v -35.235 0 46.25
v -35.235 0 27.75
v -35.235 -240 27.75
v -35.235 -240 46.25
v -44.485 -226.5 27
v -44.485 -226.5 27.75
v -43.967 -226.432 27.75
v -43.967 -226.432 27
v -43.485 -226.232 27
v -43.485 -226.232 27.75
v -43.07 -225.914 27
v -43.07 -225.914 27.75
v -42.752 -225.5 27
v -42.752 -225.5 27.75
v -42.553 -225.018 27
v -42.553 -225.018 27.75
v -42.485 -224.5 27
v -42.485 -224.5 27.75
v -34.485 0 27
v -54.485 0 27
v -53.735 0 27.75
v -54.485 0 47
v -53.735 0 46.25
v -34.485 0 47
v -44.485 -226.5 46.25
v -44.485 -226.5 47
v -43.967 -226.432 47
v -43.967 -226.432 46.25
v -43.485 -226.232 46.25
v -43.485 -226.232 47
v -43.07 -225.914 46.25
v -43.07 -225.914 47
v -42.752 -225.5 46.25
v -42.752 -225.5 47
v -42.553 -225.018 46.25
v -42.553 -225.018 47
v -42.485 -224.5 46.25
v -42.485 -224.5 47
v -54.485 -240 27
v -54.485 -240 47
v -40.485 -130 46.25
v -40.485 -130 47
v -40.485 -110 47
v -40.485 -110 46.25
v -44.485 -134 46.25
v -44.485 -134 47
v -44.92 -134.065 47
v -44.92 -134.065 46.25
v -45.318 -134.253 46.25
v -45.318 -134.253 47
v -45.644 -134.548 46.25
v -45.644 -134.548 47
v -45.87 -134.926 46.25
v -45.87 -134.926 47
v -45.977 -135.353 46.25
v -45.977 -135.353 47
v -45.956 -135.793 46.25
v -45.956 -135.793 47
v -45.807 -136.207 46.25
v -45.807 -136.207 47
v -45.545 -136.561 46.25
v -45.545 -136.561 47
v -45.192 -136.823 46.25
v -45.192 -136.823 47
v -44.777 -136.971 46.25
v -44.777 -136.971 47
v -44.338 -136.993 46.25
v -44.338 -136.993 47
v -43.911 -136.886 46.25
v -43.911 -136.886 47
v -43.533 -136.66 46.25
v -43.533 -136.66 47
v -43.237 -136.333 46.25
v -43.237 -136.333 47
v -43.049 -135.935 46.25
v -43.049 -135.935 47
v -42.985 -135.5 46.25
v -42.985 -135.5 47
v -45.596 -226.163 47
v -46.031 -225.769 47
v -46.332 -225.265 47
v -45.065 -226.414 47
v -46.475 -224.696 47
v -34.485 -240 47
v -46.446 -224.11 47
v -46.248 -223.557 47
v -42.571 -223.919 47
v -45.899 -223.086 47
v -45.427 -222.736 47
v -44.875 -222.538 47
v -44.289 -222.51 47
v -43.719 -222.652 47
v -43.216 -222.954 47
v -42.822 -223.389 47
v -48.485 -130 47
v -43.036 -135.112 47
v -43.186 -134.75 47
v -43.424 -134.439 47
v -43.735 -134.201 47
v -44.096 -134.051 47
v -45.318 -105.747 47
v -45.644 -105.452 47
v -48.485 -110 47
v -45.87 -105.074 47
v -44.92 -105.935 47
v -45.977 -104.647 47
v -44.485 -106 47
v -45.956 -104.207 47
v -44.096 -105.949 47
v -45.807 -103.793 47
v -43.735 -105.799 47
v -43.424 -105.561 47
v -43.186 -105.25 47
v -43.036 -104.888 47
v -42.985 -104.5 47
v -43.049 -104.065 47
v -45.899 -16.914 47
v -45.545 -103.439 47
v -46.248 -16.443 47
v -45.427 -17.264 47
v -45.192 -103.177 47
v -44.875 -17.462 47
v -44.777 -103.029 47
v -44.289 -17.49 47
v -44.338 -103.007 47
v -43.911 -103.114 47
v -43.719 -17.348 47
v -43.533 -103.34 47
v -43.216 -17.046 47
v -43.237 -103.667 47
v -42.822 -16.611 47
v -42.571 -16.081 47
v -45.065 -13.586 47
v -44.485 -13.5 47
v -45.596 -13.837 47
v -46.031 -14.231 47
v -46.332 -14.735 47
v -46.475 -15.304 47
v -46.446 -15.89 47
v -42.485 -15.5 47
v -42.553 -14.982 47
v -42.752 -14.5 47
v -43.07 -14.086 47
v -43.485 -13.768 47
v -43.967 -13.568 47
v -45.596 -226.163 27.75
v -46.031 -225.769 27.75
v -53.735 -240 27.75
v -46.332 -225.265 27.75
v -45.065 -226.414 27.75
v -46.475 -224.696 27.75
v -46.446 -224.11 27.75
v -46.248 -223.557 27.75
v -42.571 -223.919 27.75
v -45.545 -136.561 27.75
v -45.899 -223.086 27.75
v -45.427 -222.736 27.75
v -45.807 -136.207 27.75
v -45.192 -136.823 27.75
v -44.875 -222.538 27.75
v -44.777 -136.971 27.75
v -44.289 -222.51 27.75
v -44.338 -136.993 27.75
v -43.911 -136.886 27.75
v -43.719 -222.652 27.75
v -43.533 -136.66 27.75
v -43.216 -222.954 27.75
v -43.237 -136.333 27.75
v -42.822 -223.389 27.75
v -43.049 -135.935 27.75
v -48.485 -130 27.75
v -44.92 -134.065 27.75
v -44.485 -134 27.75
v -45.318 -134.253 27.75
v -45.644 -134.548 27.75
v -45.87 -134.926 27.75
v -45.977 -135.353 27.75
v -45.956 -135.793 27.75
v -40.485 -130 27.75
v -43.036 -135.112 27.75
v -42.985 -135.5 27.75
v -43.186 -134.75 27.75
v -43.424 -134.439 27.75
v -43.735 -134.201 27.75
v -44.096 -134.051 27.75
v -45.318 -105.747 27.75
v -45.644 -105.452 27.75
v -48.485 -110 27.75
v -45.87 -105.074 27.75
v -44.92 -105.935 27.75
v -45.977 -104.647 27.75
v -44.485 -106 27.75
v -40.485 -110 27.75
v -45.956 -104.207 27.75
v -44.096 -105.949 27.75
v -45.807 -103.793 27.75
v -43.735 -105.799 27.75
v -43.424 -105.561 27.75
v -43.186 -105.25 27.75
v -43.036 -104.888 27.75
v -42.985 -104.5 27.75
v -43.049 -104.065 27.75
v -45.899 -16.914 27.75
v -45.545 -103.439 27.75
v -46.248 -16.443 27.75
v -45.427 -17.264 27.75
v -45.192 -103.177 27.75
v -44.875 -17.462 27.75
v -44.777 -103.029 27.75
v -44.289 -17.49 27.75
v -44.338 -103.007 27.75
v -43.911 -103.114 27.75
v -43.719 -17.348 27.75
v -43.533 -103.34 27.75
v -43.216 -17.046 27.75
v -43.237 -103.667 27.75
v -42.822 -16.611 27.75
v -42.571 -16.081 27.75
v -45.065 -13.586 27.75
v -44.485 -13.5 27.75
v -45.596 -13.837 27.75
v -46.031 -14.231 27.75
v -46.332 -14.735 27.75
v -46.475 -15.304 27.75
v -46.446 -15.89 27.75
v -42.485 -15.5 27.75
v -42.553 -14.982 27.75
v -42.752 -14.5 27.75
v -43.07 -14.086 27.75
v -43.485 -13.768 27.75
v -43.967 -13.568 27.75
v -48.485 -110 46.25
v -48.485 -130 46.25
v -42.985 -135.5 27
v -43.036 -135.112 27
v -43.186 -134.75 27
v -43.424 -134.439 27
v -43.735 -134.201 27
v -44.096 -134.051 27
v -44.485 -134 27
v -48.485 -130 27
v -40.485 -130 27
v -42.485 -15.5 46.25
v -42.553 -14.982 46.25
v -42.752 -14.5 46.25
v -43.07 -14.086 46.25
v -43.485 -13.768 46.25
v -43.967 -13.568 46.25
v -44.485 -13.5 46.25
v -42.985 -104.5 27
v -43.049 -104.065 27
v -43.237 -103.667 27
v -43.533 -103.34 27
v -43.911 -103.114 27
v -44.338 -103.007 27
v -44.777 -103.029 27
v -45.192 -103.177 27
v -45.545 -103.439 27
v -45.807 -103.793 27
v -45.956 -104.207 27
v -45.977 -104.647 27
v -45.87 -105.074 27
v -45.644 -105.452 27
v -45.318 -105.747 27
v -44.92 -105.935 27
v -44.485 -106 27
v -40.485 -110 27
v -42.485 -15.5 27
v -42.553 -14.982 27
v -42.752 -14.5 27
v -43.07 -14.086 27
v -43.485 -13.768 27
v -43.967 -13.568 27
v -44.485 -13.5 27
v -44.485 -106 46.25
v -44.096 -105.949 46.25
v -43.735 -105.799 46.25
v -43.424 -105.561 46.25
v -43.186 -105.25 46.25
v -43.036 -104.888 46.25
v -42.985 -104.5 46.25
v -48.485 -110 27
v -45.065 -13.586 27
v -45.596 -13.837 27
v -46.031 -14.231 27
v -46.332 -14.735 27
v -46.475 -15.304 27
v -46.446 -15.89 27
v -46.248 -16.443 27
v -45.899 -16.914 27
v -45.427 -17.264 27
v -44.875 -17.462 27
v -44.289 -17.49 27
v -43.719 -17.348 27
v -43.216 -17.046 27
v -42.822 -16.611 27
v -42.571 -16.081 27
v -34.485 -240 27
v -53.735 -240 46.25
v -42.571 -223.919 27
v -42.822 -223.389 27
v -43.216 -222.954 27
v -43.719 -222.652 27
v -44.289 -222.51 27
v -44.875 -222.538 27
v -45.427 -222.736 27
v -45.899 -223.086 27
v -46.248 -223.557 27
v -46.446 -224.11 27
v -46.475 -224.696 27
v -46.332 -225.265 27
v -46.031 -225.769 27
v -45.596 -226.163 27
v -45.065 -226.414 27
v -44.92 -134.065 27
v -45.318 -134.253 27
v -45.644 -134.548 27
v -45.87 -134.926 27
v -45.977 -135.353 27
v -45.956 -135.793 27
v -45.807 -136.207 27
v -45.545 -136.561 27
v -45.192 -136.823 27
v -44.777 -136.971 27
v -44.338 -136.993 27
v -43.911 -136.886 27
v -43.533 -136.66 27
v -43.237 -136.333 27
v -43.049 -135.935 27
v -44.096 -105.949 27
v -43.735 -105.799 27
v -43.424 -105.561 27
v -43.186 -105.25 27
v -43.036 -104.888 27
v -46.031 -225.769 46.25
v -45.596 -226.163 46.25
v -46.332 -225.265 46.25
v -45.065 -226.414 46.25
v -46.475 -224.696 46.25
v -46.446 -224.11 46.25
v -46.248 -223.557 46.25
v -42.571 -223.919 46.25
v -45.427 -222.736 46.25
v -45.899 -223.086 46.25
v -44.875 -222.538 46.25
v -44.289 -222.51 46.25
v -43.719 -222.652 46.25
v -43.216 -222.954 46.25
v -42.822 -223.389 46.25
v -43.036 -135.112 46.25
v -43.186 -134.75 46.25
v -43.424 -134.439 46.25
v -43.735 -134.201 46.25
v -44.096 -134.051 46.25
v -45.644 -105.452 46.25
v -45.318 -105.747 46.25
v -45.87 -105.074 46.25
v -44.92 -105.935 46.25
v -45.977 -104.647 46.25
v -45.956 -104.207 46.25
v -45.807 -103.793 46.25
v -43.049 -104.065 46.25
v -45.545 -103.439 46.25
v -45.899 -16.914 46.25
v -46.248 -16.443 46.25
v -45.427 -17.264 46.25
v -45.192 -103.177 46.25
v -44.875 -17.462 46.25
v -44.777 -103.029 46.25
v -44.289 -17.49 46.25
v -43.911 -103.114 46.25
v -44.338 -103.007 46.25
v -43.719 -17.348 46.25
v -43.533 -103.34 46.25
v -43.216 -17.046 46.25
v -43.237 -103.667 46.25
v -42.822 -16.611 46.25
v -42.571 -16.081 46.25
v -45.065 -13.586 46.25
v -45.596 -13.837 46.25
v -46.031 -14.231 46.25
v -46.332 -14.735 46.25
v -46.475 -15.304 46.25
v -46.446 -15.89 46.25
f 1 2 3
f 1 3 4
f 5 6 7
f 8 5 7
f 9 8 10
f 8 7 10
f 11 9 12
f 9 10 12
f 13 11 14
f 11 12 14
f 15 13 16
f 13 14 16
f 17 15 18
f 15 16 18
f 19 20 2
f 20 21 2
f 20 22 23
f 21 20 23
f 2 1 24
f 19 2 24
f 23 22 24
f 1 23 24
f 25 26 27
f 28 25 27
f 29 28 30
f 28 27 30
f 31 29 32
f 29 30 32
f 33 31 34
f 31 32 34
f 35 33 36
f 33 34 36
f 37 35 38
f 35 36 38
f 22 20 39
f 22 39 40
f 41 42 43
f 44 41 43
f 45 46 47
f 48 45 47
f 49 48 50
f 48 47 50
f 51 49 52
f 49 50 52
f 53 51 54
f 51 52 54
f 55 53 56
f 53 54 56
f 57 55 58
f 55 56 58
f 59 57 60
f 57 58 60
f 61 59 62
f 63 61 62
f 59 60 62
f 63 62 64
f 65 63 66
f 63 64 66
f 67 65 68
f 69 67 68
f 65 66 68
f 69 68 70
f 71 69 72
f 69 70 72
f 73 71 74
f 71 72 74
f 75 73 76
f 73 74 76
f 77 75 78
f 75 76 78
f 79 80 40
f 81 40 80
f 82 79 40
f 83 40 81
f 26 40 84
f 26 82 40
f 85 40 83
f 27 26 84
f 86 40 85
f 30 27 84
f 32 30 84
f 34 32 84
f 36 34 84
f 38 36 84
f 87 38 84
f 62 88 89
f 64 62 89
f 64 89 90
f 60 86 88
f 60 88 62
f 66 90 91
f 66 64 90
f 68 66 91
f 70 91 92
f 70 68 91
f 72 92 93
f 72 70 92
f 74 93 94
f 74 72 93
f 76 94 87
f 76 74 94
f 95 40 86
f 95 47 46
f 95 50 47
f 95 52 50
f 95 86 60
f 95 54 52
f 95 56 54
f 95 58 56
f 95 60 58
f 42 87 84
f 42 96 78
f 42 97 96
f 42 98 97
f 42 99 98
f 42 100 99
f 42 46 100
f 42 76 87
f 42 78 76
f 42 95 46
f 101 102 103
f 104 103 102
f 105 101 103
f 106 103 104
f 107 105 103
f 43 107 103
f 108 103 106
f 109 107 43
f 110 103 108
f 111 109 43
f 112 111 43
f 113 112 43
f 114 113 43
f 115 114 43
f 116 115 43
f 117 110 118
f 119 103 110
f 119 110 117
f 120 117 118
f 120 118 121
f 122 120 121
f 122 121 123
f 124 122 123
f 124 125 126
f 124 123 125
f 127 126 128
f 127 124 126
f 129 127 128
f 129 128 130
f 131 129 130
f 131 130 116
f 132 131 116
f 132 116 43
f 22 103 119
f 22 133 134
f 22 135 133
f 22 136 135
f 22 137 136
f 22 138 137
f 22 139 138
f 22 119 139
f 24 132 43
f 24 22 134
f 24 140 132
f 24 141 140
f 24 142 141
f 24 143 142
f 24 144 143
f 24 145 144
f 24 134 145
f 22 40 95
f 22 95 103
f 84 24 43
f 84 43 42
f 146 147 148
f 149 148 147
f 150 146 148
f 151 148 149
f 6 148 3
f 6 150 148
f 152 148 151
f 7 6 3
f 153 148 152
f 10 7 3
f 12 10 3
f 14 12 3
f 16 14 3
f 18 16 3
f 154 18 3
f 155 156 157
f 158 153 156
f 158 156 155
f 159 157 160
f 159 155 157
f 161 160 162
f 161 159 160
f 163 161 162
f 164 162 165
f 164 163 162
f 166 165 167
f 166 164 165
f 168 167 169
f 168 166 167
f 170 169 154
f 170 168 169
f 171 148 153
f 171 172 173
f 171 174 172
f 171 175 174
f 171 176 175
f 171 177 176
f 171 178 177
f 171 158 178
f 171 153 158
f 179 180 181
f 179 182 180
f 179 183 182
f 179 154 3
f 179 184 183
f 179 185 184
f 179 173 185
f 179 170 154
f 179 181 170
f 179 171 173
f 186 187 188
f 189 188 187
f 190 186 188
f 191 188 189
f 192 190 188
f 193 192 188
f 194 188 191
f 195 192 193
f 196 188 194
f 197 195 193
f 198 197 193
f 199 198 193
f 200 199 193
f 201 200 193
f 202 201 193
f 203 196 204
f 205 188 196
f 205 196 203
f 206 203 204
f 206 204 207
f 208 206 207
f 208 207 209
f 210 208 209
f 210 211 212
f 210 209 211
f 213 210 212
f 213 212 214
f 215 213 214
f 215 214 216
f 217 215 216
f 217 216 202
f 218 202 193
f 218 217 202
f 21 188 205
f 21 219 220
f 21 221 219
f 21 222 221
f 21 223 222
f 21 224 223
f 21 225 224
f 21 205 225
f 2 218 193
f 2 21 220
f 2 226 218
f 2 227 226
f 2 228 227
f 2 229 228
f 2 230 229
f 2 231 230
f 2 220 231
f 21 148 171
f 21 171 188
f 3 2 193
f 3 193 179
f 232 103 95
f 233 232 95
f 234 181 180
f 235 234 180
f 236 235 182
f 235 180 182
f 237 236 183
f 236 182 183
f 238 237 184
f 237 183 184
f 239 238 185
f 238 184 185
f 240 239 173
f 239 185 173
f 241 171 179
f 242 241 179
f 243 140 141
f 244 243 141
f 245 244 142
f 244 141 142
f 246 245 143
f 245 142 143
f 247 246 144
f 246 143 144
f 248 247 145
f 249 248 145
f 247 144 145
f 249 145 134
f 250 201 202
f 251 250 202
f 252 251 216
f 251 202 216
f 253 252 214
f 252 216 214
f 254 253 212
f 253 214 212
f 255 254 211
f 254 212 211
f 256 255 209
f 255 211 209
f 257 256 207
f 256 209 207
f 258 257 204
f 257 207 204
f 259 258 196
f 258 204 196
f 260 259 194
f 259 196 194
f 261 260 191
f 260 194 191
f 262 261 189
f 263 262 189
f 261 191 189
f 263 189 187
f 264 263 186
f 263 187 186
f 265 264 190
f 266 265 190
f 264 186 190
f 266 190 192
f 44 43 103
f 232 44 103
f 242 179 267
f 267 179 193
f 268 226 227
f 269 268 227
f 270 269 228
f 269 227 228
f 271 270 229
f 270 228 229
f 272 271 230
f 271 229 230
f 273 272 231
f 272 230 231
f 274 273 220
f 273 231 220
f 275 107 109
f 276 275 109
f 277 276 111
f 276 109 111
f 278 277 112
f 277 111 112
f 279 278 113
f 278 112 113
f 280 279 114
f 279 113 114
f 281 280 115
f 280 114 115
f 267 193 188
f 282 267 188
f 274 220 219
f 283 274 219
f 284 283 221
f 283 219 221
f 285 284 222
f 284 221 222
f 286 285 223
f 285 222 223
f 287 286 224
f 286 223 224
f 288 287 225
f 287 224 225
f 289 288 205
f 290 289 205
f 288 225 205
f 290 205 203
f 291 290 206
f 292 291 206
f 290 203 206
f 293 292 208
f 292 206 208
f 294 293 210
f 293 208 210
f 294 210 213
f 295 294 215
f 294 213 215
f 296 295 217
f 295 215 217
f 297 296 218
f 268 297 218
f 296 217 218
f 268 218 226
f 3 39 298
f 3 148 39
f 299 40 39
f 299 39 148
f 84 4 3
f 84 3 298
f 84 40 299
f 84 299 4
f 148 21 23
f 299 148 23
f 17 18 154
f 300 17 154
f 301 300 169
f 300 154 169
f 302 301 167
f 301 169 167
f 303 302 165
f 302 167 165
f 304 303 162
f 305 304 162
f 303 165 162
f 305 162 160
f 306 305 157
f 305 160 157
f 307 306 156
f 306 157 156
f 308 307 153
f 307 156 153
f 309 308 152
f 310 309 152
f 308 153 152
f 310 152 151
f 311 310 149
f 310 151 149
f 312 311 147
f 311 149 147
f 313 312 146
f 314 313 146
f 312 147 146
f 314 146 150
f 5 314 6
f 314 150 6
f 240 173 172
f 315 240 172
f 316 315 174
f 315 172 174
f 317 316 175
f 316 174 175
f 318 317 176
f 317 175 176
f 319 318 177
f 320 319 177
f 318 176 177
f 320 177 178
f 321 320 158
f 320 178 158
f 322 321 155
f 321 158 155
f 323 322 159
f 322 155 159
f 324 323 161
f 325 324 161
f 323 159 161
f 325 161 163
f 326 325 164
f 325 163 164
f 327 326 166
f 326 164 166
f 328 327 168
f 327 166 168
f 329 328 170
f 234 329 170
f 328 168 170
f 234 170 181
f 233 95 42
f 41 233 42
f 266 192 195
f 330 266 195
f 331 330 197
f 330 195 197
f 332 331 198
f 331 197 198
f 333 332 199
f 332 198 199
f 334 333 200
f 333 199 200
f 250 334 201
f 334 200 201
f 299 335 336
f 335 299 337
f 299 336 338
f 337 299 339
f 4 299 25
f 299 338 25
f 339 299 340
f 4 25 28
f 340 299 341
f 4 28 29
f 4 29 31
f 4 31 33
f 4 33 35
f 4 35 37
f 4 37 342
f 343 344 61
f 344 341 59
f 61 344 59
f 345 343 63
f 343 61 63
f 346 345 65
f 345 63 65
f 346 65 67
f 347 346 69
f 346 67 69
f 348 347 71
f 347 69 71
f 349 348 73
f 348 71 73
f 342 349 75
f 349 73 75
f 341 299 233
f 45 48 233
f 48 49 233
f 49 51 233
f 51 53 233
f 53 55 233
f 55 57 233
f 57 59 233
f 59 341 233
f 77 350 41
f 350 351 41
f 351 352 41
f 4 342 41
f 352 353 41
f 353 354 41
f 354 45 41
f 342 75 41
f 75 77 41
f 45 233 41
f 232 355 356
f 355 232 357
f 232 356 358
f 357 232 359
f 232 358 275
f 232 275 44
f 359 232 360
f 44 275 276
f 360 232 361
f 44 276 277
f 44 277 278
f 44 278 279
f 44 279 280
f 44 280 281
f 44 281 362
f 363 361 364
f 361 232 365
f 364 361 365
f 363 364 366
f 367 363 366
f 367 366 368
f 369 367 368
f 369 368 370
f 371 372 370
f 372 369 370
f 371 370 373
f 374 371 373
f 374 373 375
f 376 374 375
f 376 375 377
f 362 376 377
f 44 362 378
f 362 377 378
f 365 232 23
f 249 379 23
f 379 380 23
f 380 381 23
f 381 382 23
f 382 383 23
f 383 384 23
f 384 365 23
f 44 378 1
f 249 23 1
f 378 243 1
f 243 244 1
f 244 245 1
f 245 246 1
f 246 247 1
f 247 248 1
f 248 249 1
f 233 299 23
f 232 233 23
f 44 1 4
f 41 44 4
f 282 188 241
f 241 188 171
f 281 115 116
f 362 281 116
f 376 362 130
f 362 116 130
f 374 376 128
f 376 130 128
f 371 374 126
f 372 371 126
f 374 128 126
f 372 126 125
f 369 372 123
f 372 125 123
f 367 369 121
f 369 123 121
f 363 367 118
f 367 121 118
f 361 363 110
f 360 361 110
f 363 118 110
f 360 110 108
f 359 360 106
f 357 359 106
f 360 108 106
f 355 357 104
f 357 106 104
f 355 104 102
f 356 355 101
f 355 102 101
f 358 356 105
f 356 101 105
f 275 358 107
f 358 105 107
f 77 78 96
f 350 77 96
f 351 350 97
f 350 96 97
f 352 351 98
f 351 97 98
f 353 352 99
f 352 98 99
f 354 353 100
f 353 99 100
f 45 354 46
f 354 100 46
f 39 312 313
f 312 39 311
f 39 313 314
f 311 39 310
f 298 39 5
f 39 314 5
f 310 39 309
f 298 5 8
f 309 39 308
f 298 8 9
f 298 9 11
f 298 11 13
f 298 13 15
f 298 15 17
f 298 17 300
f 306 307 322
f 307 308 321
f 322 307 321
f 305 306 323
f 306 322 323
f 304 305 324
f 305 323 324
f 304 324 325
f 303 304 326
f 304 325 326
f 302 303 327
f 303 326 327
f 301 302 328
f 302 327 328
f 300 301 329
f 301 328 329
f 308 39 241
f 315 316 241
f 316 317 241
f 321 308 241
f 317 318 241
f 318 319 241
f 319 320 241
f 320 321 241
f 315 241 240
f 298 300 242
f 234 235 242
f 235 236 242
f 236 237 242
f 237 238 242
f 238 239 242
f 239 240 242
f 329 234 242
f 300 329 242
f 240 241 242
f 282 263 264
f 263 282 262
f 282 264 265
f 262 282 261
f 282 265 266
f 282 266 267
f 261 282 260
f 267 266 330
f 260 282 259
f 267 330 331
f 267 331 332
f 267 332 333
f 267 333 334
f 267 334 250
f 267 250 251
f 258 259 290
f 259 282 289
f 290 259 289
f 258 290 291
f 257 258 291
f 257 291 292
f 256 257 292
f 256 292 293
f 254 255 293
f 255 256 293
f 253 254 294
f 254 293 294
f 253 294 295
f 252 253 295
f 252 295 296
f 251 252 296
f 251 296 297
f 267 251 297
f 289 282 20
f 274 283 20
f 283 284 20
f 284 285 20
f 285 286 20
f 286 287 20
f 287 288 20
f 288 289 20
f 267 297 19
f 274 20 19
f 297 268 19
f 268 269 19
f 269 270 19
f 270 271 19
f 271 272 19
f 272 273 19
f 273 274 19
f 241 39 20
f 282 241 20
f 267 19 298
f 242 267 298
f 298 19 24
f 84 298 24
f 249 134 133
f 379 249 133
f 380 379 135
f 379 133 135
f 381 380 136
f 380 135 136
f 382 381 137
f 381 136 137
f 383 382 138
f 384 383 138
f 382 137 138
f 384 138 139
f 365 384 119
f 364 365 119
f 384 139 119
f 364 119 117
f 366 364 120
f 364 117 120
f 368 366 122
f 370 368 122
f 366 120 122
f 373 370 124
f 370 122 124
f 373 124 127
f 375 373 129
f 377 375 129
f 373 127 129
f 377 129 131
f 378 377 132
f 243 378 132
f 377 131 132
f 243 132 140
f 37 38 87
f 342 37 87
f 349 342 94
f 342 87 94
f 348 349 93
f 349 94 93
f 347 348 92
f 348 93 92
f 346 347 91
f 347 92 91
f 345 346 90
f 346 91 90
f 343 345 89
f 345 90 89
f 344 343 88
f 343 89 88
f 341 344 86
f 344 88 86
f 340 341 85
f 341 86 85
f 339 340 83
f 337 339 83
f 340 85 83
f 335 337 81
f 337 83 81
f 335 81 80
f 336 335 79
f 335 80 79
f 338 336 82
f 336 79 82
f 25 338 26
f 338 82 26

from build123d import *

# Parameters (mm, degrees)
F0_W     = 20
F0_H     = 20
F0_W_2   = 18.5
F0_H_2   = 18.5
F1_DEPTH = 240
F2_W     = 6
F2_H     = 9
F3_DEPTH = 25
F5_DEPTH = 25


with BuildPart() as f1:
    # F0 (on Front) → F1 (new body)
    with BuildSketch(Plane.XZ):
        with Locations((-44.484539, 36.999997)):
            Rectangle(F0_W, F0_H)
        with Locations((-44.484539, 36.999997)):
            Rectangle(F0_W_2, F0_H_2, mode=Mode.SUBTRACT)
    extrude(amount=F1_DEPTH)

    # F2 (on face) → F3 (cut)
    with BuildSketch(Plane.XY.offset(46.999997)):
        with Locations((-44.484539, -124.5)):
            Rectangle(F2_W, F2_H)
        with Locations((-44.484539, -115.5)):
            Rectangle(F2_W, F2_H)
        Polygon((-48.484539, -110), (-48.484539, -120), (-47.484539, -120), (-47.484539, -111), (-41.484539, -111), (-41.484539, -120), (-40.484539, -120), (-40.484539, -110), (-44.484539, -110), align=None)
        Polygon((-47.484539, -120), (-48.484539, -120), (-48.484539, -130), (-44.484539, -130), (-40.484539, -130), (-40.484539, -120), (-41.484539, -120), (-41.484539, -129), (-47.484539, -129), align=None)
        with BuildLine():
            ThreePointArc((-42.984539, -104.5), (-45.545199, -103.43934), (-44.484539, -106))
            ThreePointArc((-44.484539, -106), (-43.423879, -105.56066), (-42.984539, -104.5))
        make_face()
        with BuildLine():
            ThreePointArc((-42.984539, -135.5), (-43.423879, -134.43934), (-44.484539, -134))
            ThreePointArc((-44.484539, -134), (-45.545199, -136.56066), (-42.984539, -135.5))
        make_face()
    extrude(amount=-F3_DEPTH, mode=Mode.SUBTRACT)

    # F4 (on face) → F5 (cut)
    with BuildSketch(Plane.XY.offset(46.999997)):
        with BuildLine():
            ThreePointArc((-44.484539, -226.5), (-43.070325, -225.914214), (-42.484539, -224.5))
            ThreePointArc((-42.484539, -224.5), (-45.898752, -223.085786), (-44.484539, -226.5))
        make_face()
        with BuildLine():
            ThreePointArc((-44.484539, -13.5), (-45.898752, -16.914214), (-42.484539, -15.5))
            ThreePointArc((-42.484539, -15.5), (-43.070325, -14.085786), (-44.484539, -13.5))
        make_face()
    extrude(amount=-F5_DEPTH, mode=Mode.SUBTRACT)


solid = f1.part
